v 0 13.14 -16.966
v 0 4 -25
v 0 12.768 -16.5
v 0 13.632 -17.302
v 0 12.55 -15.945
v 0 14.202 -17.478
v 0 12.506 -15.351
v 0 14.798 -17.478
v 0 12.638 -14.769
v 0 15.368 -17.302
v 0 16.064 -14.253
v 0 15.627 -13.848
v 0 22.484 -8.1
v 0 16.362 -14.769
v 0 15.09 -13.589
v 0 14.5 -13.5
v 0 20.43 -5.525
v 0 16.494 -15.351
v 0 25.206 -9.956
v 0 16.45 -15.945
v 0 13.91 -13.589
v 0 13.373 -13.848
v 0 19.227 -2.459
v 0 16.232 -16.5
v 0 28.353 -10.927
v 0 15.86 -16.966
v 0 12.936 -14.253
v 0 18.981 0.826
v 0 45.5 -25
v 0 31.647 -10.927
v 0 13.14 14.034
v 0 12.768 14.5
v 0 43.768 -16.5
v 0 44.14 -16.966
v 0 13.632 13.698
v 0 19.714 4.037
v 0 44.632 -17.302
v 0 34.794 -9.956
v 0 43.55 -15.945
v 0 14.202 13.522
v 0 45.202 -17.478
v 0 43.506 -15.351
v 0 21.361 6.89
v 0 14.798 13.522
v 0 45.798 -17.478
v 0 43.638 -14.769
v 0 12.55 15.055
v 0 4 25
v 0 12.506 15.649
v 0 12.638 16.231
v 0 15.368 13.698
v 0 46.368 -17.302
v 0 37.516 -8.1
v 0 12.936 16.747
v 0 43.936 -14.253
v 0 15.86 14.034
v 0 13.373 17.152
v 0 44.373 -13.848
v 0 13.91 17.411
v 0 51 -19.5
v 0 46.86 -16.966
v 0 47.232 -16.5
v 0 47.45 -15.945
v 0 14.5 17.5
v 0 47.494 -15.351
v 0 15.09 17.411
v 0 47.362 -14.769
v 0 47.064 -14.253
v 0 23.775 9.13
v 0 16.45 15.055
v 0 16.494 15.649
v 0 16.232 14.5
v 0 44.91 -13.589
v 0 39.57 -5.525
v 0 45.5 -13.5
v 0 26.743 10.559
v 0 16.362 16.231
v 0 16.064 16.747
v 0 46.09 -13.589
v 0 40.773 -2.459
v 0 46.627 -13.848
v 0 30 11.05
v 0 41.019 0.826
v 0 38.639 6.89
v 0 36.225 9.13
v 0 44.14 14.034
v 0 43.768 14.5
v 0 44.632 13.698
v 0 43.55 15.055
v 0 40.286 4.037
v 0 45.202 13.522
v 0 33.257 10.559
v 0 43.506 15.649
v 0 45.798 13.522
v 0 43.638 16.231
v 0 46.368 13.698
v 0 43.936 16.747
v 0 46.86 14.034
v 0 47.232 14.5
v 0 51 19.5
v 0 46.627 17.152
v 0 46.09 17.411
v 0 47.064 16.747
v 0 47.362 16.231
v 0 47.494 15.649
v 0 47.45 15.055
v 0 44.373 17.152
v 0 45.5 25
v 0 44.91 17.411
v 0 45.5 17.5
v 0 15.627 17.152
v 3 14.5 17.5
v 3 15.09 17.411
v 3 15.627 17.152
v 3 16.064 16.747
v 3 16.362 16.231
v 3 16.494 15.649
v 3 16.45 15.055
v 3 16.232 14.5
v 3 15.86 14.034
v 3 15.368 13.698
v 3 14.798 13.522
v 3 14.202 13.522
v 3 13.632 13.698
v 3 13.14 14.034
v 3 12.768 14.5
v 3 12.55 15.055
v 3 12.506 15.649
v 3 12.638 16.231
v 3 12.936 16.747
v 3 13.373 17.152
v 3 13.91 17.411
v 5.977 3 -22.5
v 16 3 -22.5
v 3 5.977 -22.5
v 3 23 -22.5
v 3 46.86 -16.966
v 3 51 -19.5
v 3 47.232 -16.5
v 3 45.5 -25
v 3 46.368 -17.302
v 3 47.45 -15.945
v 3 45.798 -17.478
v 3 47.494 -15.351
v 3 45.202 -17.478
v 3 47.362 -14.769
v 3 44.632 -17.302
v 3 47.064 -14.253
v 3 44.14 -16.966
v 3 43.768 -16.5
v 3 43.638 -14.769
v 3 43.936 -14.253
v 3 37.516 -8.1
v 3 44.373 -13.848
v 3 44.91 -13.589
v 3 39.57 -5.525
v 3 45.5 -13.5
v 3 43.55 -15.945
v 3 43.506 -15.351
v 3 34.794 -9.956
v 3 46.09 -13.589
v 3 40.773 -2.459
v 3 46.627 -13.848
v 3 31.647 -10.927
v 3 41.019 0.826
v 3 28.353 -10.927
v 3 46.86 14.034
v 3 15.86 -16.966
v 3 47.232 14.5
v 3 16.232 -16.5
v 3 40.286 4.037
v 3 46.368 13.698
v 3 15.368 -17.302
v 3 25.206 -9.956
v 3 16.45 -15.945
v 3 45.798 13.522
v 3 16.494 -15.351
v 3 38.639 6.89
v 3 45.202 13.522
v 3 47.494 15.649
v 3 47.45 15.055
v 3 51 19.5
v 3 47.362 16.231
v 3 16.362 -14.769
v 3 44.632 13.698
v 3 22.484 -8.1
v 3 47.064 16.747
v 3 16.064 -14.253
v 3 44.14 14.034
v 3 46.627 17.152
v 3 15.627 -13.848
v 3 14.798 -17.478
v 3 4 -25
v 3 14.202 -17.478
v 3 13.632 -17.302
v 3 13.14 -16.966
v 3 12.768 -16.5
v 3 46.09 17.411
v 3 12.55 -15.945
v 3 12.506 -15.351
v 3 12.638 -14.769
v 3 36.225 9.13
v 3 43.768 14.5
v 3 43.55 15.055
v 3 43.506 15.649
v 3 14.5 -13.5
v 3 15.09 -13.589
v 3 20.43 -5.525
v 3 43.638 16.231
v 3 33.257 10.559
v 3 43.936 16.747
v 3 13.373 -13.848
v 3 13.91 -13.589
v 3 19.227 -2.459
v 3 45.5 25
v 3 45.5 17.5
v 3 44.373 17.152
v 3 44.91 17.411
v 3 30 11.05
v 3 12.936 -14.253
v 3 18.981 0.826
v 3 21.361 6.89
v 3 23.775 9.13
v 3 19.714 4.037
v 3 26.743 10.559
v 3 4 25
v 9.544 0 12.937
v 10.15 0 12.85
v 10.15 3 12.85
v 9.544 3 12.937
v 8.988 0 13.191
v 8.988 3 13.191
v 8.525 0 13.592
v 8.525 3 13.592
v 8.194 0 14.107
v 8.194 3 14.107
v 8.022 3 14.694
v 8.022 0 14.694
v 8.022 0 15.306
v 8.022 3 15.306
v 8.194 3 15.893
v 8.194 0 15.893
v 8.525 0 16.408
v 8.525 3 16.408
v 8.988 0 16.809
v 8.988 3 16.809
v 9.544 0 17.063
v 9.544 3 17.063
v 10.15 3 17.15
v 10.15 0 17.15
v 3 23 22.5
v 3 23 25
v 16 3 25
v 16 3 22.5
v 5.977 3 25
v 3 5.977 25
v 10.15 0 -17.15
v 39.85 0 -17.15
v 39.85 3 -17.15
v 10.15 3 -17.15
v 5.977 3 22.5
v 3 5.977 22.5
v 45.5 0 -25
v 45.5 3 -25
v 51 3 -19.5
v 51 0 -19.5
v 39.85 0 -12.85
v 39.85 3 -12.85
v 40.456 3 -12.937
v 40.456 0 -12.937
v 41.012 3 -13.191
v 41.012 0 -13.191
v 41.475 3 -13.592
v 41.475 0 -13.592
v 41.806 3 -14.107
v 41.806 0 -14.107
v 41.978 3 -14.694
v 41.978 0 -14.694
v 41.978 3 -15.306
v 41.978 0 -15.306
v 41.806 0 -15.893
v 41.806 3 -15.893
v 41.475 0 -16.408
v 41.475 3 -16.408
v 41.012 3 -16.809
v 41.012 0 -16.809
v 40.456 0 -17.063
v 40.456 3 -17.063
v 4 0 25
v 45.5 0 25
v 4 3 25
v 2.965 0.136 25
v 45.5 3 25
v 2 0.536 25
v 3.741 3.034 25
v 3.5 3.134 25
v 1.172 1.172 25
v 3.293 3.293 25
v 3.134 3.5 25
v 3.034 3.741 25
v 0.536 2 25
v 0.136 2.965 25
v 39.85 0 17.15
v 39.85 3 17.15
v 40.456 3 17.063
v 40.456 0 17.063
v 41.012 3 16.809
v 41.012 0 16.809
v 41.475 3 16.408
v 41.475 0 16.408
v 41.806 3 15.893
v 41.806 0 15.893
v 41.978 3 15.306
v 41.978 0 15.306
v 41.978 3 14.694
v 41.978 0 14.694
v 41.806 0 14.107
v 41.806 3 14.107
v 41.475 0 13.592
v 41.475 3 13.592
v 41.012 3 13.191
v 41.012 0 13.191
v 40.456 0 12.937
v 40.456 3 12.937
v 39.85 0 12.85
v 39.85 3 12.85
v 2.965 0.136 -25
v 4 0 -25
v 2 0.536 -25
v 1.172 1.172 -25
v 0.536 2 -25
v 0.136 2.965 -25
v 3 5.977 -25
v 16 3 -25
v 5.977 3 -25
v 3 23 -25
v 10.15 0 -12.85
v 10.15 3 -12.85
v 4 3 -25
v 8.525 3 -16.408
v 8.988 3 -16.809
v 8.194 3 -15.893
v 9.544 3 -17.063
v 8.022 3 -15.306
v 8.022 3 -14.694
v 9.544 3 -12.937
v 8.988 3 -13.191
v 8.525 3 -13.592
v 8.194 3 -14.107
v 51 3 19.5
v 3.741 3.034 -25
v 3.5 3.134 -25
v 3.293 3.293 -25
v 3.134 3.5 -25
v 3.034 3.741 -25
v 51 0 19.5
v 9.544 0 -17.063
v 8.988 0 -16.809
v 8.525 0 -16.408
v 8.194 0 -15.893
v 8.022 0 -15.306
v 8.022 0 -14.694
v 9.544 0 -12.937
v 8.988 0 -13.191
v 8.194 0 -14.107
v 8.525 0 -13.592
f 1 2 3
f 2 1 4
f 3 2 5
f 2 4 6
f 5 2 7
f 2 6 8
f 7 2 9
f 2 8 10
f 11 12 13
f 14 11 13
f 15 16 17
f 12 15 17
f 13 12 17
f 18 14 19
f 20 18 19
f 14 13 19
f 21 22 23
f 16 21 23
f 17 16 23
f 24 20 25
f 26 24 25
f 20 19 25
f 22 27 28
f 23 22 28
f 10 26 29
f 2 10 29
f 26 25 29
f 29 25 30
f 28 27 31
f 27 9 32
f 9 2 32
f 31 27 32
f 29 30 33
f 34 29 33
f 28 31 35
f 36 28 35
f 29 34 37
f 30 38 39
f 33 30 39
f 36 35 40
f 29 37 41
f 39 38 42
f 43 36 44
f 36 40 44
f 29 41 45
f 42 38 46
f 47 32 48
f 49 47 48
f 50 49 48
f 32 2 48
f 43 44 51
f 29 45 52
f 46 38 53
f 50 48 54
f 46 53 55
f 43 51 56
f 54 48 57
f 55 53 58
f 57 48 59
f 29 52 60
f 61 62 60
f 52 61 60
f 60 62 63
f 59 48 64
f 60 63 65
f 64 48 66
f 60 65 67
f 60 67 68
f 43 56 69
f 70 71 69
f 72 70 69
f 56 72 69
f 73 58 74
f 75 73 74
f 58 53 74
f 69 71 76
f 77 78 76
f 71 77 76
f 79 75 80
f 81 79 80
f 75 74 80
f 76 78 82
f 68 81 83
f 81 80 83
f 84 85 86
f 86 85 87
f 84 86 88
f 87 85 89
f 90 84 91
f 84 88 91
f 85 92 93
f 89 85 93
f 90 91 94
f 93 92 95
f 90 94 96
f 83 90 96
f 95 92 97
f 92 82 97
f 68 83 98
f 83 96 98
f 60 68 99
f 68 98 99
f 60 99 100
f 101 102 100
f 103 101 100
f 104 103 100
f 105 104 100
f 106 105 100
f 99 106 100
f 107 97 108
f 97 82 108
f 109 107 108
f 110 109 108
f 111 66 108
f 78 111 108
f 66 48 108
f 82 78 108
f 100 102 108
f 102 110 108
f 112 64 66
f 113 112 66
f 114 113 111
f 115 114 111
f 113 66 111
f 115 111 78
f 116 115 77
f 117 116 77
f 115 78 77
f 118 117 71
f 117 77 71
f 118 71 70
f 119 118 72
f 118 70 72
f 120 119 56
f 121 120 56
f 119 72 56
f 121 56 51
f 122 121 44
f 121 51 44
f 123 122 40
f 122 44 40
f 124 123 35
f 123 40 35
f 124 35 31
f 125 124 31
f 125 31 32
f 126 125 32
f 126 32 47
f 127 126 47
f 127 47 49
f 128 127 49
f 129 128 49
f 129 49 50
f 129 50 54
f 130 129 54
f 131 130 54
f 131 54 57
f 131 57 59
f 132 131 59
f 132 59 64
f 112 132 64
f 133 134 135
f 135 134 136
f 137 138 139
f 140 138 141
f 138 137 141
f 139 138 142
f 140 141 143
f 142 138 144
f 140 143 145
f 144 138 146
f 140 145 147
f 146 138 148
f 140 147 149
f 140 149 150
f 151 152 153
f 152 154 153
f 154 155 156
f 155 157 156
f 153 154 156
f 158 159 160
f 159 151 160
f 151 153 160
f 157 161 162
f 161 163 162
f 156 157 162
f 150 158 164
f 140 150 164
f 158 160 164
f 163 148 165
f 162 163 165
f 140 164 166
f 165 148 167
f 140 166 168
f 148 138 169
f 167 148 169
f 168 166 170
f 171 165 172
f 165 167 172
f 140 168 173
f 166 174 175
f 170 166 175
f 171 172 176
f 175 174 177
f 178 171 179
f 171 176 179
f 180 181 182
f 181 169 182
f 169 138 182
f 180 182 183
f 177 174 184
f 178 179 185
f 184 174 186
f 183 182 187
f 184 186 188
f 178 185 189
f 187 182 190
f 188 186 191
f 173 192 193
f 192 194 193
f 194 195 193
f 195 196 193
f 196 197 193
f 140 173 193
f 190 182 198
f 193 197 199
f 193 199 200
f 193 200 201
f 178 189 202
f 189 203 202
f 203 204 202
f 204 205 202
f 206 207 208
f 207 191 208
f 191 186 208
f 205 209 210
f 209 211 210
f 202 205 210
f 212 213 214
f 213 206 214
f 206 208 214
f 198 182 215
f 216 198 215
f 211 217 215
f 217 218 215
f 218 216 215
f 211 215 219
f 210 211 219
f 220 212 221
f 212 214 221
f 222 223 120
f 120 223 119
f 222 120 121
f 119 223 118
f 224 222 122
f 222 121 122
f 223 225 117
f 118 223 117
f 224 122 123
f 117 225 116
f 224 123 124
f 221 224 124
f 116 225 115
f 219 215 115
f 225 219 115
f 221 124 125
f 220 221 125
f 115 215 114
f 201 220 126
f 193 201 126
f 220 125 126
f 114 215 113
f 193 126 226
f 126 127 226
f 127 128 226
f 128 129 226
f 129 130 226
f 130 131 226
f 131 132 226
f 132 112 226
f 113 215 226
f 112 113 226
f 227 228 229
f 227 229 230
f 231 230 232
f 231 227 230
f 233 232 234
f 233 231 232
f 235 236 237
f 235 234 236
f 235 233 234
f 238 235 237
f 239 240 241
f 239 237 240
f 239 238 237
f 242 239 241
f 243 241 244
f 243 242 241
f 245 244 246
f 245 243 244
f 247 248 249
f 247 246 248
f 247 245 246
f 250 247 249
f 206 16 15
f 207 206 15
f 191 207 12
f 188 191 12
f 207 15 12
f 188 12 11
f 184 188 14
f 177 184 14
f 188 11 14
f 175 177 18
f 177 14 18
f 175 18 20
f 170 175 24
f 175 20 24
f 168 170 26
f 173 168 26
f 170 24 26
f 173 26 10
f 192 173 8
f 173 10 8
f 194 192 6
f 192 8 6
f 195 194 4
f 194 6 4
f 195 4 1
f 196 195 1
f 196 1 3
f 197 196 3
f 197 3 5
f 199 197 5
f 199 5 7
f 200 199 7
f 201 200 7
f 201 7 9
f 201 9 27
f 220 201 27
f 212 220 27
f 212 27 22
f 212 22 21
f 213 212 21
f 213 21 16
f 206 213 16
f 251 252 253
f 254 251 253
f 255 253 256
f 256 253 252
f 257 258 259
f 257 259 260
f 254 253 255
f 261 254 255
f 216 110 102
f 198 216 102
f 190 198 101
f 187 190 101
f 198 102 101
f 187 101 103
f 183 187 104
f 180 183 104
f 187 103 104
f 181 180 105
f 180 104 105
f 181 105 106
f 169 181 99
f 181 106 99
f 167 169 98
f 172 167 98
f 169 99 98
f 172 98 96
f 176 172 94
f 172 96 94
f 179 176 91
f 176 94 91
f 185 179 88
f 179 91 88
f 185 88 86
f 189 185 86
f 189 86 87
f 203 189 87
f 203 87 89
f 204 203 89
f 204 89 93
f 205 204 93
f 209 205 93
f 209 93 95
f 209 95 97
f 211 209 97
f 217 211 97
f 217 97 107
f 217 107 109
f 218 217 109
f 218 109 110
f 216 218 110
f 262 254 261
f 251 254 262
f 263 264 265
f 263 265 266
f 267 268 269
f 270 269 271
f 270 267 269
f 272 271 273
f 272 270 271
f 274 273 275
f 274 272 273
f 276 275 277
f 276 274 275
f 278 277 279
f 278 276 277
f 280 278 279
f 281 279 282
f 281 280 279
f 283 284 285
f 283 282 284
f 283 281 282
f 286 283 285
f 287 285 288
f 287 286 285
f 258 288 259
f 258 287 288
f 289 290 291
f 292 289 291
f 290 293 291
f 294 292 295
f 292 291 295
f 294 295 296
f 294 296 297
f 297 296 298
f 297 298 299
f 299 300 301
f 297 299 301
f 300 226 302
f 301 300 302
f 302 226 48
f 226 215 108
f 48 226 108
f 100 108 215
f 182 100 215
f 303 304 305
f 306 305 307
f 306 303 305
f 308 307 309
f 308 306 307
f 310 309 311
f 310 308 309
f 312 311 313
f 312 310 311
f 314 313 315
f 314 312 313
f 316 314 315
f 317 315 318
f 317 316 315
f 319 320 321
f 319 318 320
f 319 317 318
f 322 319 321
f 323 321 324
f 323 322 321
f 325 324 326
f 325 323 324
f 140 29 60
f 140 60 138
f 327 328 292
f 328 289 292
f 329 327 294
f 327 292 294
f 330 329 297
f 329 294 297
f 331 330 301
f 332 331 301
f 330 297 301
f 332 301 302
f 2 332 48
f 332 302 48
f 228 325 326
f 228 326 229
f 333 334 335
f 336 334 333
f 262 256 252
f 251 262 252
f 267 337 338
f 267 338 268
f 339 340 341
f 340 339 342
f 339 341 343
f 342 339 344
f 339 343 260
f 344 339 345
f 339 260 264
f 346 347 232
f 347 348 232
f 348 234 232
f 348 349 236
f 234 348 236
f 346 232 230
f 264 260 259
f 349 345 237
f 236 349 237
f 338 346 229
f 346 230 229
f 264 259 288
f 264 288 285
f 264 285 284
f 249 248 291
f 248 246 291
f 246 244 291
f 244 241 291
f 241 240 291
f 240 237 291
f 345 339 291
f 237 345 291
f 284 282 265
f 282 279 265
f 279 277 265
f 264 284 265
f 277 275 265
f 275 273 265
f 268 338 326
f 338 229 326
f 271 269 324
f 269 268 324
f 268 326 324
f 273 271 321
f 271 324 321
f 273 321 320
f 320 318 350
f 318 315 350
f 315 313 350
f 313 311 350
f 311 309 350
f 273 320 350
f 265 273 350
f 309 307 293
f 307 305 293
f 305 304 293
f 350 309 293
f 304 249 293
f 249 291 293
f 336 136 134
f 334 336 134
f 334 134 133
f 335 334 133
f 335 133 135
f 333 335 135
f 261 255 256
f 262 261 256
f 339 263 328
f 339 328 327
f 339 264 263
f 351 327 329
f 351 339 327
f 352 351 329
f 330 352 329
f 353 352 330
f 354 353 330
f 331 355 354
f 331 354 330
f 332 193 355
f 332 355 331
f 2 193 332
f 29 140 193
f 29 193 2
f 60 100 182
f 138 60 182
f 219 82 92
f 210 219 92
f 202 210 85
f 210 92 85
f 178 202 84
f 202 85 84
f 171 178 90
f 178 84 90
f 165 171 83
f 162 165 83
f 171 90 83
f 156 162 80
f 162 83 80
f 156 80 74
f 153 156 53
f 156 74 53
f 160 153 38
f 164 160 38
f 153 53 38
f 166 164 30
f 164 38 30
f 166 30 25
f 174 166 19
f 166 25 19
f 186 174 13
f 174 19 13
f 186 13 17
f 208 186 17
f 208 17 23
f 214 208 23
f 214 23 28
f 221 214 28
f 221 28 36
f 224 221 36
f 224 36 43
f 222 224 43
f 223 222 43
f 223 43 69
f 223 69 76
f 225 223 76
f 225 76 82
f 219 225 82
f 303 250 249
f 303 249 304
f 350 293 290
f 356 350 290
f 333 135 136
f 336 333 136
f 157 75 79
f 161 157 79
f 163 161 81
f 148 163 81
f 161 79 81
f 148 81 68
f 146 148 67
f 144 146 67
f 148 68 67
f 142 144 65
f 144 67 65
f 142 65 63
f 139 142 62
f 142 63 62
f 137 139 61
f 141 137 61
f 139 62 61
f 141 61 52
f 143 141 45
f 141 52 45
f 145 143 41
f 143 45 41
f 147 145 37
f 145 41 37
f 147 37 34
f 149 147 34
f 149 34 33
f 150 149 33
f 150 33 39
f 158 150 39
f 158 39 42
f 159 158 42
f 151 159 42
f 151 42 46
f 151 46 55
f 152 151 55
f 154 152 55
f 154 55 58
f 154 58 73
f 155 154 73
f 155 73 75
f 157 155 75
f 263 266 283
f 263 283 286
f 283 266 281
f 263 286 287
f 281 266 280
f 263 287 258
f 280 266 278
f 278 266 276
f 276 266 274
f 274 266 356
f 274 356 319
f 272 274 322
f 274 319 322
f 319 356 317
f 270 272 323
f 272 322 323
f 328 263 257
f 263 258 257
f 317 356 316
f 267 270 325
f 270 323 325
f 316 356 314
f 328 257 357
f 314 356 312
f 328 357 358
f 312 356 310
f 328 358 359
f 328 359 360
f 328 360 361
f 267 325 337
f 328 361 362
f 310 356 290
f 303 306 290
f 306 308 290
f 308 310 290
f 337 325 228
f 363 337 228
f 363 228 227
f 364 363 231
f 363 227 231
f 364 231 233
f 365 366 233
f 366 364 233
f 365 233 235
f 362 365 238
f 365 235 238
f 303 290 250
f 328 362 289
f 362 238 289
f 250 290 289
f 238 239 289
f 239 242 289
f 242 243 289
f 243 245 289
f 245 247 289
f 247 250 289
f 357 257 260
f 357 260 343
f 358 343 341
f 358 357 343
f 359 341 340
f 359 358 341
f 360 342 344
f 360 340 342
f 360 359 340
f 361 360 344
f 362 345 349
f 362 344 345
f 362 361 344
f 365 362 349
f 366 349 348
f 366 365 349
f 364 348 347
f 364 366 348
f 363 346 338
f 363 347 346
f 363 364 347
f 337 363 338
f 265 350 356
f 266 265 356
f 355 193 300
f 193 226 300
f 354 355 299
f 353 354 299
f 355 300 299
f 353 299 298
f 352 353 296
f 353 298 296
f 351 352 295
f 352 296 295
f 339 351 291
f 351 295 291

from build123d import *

# Parameters (mm, degrees)
BASE_FLANGE1_DEPTH  = 25
SKETCH7_R           = 11.05
SKETCH7_R_2         = 2
CUT_EXTRUDE1_DEPTH  = 77.334788924
CUT_EXTRUDE2_DEPTH  = 77.334788924
CHAMFER2_SIZE       = 5.5
BOSS_EXTRUDE2_DEPTH = 2.5
LPATTERN1_COUNT     = 2
LPATTERN1_PITCH     = 47.5


# Sheet-metal steps are written as plain solids
with BuildPart() as part:
    # Sketch2 → Base-Flange1 (new, symmetric)
    with BuildSketch(Plane.XY):
        with BuildLine():
            Line((51, 0), (4, 0))
            ThreePointArc((4, 0), (1.171572875, 1.171572875), (0, 4))
            Line((0, 4), (0, 51))
            Line((0, 51), (3, 51))
            Line((3, 51), (3, 4))
            ThreePointArc((3, 4), (3.292893219, 3.292893219), (4, 3))
            Line((4, 3), (51, 3))
            Line((51, 3), (51, 0))
        make_face()
    extrude(amount=BASE_FLANGE1_DEPTH, both=True)

    # Sketch7 → Cut-Extrude1 (cut, through all)
    with BuildSketch(Plane.ZY):
        with Locations((0, 30)):
            Circle(SKETCH7_R)
        with Locations((-15.5, 45.5)):
            Circle(SKETCH7_R_2)
        with Locations((15.5, 45.5)):
            Circle(SKETCH7_R_2)
        with Locations((15.5, 14.5)):
            Circle(SKETCH7_R_2)
        with Locations((-15.5, 14.5)):
            Circle(SKETCH7_R_2)
    extrude(amount=-CUT_EXTRUDE1_DEPTH, mode=Mode.SUBTRACT)

    # Sketch8 → Cut-Extrude2 (cut, through all)
    with BuildSketch(Plane.XZ):
        with BuildLine():
            Line((39.85, -17.15), (10.15, -17.15))
            ThreePointArc((10.15, -17.15), (8, -15), (10.15, -12.85))
            Line((10.15, -12.85), (39.85, -12.85))
            ThreePointArc((39.85, -12.85), (42, -15), (39.85, -17.15))
        make_face()
        with BuildLine():
            Line((39.85, 12.85), (10.15, 12.85))
            ThreePointArc((10.15, 12.85), (8, 15), (10.15, 17.15))
            Line((10.15, 17.15), (39.85, 17.15))
            ThreePointArc((39.85, 17.15), (42, 15), (39.85, 12.85))
        make_face()
    extrude(amount=-CUT_EXTRUDE2_DEPTH, mode=Mode.SUBTRACT)

    # Chamfer2
    chamfer2_edges = [part.edges().sort_by_distance(p)[0] for p in [
        (1.5, 51, 25),
        (51, 1.5, 25),
        (1.5, 51, -25),
        (51, 1.5, -25),
    ]]
    chamfer(chamfer2_edges, length=CHAMFER2_SIZE)


with BuildPart() as body_2:
    # Sketch9 → Boss-Extrude2 (new body)
    with BuildSketch(Plane.XY.offset(25)):
        Polygon((3, 23), (16, 3), (5.976752293, 3), (3, 5.976752293), align=None)
    boss_extrude2 = extrude(amount=-BOSS_EXTRUDE2_DEPTH)


with BuildPart() as lpattern1_1:
    # LPattern1: Boss-Extrude2 ×2
    with Locations(*[(0, 0, -i * LPATTERN1_PITCH) for i in range(1, LPATTERN1_COUNT)]):
        add(boss_extrude2)


solid = Compound([part.part, body_2.part, lpattern1_1.part])
